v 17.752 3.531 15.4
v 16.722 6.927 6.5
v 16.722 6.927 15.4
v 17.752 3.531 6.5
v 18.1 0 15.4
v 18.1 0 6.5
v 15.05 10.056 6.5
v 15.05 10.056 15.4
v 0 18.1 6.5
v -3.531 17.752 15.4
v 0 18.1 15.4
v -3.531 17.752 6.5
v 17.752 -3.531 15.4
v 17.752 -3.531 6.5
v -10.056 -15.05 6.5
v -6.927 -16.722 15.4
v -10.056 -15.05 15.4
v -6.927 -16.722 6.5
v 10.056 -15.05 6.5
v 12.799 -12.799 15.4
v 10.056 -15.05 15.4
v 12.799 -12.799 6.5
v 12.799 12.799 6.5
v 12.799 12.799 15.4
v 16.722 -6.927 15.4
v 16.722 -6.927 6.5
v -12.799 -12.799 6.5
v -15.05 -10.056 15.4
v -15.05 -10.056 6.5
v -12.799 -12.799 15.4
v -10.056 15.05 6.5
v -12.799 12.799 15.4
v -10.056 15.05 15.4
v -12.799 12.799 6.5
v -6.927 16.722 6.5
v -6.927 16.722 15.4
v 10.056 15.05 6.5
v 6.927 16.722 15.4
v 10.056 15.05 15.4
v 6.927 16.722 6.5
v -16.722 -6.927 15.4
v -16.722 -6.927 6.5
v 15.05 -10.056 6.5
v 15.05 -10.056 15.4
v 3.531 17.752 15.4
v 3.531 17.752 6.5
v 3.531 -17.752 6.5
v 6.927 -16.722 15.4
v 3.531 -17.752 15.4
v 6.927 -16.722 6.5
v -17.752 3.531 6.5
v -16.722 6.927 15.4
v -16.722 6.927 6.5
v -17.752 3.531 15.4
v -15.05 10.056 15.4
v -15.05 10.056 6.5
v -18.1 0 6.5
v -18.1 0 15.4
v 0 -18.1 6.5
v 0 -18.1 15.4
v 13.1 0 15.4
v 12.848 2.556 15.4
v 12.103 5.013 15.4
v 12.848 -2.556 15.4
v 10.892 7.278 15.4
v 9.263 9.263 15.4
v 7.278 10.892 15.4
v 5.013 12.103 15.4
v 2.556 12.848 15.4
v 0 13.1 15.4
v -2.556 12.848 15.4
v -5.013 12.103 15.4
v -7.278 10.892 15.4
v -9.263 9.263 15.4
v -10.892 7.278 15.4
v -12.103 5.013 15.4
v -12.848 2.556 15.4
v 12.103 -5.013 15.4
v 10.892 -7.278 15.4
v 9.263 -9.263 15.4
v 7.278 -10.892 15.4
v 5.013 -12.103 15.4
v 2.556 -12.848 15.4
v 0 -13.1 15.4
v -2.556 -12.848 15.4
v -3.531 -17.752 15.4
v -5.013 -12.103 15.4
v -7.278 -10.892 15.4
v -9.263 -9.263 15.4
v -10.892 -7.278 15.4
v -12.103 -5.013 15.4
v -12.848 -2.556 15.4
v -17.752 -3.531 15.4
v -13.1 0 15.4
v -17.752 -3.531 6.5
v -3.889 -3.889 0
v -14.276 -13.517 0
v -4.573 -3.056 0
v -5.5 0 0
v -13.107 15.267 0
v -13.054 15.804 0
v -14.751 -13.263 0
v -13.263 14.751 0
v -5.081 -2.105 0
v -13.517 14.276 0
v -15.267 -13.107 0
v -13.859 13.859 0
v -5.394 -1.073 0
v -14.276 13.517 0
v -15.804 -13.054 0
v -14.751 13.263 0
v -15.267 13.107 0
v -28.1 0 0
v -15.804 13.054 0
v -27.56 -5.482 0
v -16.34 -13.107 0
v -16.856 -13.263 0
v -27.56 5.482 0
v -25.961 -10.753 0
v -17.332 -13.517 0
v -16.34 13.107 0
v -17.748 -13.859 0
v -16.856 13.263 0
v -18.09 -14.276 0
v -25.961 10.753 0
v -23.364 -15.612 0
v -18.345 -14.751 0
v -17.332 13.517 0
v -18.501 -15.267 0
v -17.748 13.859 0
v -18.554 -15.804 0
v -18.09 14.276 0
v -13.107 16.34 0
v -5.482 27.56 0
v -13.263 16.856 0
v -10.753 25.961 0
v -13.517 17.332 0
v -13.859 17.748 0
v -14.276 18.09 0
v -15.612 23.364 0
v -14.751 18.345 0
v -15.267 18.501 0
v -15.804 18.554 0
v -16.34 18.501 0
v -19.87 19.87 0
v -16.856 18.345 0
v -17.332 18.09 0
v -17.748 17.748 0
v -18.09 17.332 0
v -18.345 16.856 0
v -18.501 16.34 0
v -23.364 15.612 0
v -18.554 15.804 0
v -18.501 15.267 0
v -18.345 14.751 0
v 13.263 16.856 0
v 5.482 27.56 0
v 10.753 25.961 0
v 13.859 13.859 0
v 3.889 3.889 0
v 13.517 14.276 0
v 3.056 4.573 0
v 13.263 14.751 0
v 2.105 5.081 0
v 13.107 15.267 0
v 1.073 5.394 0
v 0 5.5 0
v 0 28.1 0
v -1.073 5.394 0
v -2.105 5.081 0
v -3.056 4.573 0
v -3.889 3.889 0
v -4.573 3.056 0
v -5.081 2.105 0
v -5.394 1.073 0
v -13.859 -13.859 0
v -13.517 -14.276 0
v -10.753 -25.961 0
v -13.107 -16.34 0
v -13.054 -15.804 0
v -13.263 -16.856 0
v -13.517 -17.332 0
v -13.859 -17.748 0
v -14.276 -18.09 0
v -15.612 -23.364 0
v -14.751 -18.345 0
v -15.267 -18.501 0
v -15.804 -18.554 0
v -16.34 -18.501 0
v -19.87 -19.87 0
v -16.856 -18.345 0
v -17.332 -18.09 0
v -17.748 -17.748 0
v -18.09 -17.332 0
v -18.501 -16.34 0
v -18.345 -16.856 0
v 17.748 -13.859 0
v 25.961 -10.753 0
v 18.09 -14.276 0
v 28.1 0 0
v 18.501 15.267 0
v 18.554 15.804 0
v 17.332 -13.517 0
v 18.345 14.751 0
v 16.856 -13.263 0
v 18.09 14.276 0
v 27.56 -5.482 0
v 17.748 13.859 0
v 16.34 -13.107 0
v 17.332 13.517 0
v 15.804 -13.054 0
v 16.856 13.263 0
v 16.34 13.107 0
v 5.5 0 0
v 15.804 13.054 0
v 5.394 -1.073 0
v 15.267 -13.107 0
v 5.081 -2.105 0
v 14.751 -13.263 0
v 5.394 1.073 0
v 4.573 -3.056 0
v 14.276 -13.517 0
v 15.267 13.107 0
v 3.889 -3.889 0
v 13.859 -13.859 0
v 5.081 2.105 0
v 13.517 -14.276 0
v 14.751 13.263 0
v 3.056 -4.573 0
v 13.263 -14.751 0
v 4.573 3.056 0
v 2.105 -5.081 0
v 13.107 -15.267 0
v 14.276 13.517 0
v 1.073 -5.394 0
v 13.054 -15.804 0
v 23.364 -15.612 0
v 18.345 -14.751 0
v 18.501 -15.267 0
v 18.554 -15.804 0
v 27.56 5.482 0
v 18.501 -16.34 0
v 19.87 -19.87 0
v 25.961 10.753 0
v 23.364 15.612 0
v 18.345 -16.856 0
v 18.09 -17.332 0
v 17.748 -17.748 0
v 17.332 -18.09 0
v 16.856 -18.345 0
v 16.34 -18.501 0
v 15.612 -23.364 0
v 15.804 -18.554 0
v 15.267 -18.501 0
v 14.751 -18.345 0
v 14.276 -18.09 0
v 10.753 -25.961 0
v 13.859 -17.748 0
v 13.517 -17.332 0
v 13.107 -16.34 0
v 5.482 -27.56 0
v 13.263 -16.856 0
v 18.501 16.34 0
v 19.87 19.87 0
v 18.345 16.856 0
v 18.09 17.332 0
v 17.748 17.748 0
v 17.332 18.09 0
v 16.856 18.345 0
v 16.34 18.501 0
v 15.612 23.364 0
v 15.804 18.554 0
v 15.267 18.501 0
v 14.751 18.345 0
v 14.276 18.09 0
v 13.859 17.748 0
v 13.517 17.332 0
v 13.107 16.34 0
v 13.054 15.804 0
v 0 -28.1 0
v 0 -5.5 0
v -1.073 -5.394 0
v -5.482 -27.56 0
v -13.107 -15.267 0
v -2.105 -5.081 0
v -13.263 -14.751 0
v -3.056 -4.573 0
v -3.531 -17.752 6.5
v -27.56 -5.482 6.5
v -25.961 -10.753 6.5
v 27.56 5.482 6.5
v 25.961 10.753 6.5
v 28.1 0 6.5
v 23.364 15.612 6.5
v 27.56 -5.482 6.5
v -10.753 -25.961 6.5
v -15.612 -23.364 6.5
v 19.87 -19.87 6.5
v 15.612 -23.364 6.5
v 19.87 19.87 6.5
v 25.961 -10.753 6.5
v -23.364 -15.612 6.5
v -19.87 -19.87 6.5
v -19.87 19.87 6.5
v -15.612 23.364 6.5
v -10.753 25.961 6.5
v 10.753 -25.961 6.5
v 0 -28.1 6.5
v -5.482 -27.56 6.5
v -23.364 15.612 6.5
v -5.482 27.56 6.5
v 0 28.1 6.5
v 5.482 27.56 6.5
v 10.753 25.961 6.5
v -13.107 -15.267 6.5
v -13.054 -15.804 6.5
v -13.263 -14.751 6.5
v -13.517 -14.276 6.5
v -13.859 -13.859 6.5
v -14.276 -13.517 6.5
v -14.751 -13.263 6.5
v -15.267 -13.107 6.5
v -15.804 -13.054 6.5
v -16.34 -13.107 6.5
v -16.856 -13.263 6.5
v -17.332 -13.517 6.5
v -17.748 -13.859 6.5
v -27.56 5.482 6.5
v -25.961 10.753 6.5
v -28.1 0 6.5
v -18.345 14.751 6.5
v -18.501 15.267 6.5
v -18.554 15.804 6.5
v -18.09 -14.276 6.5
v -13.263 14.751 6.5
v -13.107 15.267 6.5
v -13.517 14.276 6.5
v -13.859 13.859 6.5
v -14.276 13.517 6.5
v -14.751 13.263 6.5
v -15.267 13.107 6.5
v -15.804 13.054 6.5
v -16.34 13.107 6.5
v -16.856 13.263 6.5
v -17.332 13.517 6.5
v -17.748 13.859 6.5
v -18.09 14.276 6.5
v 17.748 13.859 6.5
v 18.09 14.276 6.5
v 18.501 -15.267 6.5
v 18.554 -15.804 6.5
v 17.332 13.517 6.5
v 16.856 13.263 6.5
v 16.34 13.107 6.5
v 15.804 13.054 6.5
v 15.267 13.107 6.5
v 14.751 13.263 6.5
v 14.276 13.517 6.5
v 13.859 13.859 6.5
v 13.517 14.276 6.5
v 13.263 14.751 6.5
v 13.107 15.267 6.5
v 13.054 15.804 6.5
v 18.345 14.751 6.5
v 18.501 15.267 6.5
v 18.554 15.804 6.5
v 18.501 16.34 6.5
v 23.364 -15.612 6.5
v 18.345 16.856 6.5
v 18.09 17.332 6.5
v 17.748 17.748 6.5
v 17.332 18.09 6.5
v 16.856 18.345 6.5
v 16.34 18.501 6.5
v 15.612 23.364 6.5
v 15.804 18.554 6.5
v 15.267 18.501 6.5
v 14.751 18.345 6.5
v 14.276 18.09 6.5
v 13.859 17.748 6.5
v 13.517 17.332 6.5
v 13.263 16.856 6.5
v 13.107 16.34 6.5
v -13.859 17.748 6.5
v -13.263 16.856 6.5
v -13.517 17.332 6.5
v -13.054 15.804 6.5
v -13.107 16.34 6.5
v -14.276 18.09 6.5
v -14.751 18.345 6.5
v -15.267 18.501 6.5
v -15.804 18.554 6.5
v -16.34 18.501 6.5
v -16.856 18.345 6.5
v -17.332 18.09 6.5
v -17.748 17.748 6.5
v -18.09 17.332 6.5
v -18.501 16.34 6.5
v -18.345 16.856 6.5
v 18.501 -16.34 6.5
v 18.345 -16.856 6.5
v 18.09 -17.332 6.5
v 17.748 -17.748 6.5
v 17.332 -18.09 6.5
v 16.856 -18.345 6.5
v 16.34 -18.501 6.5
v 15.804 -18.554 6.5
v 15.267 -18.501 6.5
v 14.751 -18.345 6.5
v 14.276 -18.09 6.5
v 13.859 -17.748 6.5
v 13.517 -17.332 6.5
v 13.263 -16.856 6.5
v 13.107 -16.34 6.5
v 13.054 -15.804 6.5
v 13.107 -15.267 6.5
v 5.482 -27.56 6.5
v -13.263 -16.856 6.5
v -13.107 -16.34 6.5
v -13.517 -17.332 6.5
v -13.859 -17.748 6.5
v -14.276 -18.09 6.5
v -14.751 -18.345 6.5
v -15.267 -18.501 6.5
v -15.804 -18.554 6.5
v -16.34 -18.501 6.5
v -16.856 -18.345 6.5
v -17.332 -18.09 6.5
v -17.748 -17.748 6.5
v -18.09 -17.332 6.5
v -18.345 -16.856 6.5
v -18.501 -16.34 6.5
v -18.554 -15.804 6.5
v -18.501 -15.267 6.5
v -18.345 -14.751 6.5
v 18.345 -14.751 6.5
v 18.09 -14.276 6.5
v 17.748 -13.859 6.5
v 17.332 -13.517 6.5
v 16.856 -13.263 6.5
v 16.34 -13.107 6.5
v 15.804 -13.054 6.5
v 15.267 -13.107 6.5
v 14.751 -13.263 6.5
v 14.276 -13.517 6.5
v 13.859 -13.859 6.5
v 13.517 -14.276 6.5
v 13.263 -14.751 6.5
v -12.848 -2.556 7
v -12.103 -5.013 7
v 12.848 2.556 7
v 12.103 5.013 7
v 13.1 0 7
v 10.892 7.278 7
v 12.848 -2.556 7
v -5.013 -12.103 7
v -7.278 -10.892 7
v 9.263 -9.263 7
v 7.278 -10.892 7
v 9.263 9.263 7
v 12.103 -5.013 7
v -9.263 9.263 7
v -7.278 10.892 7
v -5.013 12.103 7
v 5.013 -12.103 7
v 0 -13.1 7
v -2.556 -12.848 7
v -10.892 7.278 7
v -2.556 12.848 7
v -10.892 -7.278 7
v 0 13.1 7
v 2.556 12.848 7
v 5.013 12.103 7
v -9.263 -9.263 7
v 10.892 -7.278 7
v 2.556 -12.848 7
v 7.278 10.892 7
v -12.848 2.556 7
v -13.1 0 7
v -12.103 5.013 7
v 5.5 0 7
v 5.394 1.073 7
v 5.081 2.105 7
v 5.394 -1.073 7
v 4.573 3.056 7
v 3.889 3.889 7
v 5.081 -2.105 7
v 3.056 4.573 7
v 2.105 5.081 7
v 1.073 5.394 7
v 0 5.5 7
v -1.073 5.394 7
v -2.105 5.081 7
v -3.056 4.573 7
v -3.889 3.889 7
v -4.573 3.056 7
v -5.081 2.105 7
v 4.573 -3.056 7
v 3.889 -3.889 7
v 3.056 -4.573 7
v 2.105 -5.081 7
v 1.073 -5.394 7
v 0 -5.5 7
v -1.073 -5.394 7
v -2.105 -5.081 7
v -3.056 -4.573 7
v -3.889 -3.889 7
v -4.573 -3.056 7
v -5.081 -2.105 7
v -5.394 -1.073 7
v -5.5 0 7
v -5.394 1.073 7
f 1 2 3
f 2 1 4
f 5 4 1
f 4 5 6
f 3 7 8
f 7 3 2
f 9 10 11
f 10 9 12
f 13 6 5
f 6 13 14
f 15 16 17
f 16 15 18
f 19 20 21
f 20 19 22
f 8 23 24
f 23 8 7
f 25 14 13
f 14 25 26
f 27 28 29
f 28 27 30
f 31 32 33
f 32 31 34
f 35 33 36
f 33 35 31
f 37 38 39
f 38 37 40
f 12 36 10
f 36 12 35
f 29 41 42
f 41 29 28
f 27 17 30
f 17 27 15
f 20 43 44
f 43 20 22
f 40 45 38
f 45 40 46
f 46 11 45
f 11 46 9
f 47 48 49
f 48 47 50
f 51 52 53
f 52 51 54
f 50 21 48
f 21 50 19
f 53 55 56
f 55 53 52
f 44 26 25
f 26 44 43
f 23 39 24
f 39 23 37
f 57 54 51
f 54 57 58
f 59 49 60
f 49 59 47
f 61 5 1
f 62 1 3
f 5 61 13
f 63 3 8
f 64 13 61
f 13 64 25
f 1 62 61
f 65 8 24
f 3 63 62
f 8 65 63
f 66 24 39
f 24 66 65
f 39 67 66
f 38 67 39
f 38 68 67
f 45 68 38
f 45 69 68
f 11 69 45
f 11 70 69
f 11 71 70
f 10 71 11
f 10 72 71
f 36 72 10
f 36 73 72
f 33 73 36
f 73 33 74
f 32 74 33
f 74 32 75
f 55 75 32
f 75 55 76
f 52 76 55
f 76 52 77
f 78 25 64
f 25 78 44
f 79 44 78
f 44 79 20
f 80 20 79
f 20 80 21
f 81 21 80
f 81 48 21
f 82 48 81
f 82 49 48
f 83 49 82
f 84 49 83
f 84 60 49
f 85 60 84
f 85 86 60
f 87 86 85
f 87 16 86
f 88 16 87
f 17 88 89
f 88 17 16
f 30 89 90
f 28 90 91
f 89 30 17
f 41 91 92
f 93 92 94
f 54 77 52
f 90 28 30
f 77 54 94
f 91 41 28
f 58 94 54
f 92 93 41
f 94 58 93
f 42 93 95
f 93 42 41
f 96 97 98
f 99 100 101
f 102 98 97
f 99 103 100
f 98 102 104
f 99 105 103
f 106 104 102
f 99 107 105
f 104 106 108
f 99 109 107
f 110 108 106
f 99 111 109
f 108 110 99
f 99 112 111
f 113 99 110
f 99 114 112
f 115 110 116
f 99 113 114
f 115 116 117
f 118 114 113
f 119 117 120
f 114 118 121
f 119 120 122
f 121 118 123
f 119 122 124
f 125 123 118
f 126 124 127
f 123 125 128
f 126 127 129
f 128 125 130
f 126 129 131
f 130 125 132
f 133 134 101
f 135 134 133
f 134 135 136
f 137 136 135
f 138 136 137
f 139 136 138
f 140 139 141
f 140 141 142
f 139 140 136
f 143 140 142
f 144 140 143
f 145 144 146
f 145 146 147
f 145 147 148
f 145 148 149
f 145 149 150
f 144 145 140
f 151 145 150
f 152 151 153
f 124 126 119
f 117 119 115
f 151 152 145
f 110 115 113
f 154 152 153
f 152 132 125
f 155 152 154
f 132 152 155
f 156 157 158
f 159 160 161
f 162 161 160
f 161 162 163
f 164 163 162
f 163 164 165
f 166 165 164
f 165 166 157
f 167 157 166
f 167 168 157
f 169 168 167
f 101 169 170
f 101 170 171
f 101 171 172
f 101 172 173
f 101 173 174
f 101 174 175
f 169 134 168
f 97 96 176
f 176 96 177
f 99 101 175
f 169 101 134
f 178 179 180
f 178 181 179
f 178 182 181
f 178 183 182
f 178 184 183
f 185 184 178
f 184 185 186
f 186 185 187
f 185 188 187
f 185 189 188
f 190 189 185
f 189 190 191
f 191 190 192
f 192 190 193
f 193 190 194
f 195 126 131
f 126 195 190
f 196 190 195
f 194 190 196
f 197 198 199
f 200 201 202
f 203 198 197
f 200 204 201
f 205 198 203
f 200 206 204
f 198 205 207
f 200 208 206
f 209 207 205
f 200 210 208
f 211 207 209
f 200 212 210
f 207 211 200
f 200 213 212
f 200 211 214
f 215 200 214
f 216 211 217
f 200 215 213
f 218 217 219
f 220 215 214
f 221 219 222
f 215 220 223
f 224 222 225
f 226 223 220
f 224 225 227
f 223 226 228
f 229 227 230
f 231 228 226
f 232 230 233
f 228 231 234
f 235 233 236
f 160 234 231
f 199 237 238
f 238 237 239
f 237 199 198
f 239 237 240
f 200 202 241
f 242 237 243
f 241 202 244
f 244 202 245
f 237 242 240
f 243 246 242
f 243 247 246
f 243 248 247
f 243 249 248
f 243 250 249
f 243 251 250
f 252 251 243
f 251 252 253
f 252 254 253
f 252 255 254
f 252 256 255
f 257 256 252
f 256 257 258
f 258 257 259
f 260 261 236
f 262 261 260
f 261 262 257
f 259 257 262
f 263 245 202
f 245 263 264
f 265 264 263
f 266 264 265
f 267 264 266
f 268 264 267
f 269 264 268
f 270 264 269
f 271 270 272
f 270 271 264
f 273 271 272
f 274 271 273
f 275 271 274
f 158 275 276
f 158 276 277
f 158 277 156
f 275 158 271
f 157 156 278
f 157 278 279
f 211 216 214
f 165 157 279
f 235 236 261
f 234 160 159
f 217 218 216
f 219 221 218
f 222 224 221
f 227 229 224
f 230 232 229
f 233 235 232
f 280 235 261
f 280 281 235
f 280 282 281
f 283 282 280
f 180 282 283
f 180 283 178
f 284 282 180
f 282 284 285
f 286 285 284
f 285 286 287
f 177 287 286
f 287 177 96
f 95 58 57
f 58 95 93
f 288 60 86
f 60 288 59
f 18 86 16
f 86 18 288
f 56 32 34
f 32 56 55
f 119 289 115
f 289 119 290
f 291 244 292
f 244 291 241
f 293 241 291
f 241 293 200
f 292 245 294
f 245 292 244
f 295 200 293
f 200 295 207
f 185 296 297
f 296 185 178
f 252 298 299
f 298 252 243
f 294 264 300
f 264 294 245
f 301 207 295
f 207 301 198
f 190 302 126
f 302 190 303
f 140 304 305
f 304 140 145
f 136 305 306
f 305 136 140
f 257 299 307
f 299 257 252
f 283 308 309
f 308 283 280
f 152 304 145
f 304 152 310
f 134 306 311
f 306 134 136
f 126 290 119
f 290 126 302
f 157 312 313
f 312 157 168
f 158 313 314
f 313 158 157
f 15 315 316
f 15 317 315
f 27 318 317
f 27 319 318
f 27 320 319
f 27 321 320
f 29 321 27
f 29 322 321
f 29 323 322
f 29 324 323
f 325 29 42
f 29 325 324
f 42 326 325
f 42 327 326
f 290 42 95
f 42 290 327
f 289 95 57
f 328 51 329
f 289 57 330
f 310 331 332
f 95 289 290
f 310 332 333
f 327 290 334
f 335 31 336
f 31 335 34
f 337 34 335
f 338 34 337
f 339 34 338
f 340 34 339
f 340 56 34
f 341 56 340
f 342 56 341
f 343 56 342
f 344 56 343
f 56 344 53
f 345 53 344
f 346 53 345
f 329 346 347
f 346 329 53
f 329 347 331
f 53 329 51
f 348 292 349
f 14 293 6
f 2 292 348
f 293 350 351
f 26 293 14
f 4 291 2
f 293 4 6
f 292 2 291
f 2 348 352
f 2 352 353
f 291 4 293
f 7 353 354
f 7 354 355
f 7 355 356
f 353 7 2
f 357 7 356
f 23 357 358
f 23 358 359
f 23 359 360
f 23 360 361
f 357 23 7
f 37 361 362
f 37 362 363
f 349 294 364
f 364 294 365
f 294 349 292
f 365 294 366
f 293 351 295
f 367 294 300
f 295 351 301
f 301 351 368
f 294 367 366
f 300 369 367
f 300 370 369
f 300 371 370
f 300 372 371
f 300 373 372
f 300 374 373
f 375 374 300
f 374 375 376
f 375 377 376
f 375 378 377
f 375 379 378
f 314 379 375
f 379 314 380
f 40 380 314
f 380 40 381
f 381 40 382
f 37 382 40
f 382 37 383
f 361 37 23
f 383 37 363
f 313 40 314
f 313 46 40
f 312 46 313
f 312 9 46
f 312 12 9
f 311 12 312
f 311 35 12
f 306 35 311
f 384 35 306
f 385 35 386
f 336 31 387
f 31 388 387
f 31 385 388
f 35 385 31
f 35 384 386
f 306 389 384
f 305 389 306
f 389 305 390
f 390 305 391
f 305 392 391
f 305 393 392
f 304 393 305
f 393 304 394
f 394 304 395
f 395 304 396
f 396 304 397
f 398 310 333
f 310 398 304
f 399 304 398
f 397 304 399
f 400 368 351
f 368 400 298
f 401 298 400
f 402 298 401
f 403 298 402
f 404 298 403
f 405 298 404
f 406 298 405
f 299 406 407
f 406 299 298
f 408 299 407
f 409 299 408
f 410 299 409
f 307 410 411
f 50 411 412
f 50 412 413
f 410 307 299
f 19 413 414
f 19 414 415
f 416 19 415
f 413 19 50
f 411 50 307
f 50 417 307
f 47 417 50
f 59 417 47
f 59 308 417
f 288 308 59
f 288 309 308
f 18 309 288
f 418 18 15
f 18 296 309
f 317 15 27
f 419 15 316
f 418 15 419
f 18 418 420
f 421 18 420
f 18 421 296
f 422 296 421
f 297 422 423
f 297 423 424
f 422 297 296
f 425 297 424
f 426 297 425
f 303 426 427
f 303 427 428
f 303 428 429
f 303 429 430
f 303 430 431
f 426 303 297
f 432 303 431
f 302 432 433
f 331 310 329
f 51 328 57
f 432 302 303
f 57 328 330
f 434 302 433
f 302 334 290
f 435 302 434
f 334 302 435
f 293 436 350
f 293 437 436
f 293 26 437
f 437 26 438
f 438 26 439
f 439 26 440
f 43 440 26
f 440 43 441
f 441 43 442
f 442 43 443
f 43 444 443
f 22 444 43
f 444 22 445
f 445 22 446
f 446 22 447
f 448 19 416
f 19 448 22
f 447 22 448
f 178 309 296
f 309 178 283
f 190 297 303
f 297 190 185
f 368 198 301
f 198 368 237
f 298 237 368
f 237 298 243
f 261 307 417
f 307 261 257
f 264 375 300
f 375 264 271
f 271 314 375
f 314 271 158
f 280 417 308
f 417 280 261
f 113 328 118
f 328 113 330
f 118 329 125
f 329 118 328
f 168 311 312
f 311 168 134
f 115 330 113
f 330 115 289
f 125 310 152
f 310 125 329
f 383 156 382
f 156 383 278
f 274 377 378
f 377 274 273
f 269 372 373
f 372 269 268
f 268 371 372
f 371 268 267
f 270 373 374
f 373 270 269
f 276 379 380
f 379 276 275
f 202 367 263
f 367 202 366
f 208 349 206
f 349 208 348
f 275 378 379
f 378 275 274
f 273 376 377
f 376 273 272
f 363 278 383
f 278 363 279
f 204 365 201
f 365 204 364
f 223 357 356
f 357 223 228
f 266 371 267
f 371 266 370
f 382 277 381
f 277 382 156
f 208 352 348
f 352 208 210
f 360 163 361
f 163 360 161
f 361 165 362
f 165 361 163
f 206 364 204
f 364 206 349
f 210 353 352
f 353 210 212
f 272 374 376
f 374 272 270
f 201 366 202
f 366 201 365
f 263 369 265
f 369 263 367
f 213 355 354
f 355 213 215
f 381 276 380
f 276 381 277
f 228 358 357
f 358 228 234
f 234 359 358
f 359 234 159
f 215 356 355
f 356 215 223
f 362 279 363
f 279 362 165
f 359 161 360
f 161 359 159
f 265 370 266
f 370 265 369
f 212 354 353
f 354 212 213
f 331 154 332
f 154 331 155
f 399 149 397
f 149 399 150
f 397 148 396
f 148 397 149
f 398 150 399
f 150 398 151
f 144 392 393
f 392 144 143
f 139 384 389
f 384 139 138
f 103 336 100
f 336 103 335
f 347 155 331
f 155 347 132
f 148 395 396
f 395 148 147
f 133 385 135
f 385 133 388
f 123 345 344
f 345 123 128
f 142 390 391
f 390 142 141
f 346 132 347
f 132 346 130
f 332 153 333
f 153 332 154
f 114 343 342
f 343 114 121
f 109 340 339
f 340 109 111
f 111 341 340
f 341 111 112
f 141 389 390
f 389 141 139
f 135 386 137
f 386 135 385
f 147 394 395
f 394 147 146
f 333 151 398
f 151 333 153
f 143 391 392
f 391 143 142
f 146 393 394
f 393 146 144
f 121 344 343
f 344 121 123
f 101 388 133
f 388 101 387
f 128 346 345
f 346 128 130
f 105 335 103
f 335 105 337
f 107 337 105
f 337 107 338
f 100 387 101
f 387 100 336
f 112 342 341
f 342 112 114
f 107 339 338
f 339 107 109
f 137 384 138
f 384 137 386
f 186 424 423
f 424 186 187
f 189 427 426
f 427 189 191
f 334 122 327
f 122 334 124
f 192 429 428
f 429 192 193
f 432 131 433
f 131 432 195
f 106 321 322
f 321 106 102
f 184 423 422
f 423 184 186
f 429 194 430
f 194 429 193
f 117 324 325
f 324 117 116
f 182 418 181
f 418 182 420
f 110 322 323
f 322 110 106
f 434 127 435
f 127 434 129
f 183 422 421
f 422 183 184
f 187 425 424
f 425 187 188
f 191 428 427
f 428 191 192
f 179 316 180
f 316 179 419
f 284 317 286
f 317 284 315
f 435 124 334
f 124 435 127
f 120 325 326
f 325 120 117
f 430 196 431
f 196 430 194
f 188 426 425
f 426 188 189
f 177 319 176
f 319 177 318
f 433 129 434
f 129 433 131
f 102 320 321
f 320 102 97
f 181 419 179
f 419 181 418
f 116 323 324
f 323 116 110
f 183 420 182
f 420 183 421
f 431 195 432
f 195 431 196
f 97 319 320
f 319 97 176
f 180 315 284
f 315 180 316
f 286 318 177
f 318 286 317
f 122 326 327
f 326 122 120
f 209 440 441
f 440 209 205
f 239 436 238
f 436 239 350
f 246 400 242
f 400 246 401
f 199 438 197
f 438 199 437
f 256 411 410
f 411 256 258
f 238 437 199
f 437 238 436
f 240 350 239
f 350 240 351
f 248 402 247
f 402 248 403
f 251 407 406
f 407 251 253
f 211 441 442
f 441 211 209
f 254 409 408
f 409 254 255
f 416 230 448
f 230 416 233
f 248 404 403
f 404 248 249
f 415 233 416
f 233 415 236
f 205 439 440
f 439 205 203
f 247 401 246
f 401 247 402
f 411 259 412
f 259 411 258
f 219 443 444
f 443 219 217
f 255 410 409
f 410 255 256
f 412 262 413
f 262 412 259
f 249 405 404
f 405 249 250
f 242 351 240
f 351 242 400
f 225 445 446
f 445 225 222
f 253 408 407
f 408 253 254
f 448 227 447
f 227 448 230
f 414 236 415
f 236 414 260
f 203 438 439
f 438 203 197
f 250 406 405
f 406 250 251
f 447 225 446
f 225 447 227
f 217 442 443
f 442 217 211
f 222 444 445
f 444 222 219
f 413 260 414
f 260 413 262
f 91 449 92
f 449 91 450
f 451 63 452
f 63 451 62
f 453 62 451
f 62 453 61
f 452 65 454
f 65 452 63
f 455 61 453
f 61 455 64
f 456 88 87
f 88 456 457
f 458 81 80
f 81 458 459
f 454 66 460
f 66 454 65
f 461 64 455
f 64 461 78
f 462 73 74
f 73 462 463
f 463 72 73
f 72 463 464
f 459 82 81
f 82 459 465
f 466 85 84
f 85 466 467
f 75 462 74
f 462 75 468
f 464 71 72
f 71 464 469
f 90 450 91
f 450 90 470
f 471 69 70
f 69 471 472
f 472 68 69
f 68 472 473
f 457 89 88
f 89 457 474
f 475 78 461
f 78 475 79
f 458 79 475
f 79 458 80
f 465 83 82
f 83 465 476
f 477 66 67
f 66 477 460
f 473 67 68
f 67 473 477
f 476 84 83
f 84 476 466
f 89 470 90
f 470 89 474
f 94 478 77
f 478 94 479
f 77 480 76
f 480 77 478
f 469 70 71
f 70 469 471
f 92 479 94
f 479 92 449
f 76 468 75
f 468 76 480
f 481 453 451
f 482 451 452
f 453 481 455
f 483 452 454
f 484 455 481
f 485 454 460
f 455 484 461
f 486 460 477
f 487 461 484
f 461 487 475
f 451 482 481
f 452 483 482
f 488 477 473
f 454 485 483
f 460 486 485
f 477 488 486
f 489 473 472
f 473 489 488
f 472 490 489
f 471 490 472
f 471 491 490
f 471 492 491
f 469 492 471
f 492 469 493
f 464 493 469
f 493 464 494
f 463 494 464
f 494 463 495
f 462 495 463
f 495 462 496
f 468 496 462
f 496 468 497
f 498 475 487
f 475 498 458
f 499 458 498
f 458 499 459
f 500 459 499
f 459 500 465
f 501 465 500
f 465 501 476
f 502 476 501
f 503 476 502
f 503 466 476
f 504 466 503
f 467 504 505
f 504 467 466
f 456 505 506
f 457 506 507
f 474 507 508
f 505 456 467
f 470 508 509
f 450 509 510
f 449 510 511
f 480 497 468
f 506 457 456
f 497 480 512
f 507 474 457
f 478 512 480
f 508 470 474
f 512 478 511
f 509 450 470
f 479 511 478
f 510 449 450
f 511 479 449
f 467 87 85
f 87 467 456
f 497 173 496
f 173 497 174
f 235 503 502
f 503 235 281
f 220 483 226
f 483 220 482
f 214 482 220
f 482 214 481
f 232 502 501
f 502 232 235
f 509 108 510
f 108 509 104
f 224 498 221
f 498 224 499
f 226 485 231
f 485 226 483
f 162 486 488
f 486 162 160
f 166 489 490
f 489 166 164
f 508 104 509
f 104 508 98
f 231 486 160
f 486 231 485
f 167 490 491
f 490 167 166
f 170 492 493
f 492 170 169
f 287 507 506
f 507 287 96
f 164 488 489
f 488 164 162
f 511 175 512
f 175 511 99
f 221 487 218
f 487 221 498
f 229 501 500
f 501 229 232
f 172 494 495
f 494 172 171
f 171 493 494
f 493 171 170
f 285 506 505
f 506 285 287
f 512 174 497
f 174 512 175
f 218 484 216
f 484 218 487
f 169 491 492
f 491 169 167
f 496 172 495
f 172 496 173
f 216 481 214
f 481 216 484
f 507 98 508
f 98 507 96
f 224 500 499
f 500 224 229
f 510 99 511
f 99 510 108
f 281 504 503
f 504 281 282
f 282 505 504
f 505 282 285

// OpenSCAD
$fn = 32;

// ----------------------------------------------------------------------
// Bearing housing: seat for 6000 (26 x 8 mm), 36.2 mm body
// ----------------------------------------------------------------------

// --- parameters (mm) ---
housing_d = 36.2;         // housing outside diameter
housing_h = 15.4;         // overall housing height
wall_t = 5;               // wall thickness
seat_d = 26.2;            // 6000 seat, 0.2 mm clearance
seat_h = 8.4;             // pocket depth
shoulder = 2;             // shoulder under the bearing
pass_d = 11;              // shaft passage
flange_d = 56.2;          // mounting flange diameter
flange_t = 5;             // flange thickness
bolt_d = 5.5;             // flange bolt clearance
bolt_r = 22.35;           // flange bolt circle radius

module body() {
  cylinder(h = housing_h, d = housing_d);
}

module flange() {
  /* flange sunk 1.5 mm into the body */
  cylinder(h = flange_t + 1.5, d = flange_d);
}

difference() {
  union() {
    body();
    flange();
  }
  translate([0, 0, housing_h - seat_h]) cylinder(h = seat_h + 1, d = seat_d);
  translate([0, 0, -1]) cylinder(h = housing_h - seat_h + 1, d = pass_d);
  for (i = [0 : 3]) rotate([0, 0, 45 + i * 90]) translate([bolt_r, 0, -1])
    cylinder(h = flange_t + 3, d = bolt_d);
}
